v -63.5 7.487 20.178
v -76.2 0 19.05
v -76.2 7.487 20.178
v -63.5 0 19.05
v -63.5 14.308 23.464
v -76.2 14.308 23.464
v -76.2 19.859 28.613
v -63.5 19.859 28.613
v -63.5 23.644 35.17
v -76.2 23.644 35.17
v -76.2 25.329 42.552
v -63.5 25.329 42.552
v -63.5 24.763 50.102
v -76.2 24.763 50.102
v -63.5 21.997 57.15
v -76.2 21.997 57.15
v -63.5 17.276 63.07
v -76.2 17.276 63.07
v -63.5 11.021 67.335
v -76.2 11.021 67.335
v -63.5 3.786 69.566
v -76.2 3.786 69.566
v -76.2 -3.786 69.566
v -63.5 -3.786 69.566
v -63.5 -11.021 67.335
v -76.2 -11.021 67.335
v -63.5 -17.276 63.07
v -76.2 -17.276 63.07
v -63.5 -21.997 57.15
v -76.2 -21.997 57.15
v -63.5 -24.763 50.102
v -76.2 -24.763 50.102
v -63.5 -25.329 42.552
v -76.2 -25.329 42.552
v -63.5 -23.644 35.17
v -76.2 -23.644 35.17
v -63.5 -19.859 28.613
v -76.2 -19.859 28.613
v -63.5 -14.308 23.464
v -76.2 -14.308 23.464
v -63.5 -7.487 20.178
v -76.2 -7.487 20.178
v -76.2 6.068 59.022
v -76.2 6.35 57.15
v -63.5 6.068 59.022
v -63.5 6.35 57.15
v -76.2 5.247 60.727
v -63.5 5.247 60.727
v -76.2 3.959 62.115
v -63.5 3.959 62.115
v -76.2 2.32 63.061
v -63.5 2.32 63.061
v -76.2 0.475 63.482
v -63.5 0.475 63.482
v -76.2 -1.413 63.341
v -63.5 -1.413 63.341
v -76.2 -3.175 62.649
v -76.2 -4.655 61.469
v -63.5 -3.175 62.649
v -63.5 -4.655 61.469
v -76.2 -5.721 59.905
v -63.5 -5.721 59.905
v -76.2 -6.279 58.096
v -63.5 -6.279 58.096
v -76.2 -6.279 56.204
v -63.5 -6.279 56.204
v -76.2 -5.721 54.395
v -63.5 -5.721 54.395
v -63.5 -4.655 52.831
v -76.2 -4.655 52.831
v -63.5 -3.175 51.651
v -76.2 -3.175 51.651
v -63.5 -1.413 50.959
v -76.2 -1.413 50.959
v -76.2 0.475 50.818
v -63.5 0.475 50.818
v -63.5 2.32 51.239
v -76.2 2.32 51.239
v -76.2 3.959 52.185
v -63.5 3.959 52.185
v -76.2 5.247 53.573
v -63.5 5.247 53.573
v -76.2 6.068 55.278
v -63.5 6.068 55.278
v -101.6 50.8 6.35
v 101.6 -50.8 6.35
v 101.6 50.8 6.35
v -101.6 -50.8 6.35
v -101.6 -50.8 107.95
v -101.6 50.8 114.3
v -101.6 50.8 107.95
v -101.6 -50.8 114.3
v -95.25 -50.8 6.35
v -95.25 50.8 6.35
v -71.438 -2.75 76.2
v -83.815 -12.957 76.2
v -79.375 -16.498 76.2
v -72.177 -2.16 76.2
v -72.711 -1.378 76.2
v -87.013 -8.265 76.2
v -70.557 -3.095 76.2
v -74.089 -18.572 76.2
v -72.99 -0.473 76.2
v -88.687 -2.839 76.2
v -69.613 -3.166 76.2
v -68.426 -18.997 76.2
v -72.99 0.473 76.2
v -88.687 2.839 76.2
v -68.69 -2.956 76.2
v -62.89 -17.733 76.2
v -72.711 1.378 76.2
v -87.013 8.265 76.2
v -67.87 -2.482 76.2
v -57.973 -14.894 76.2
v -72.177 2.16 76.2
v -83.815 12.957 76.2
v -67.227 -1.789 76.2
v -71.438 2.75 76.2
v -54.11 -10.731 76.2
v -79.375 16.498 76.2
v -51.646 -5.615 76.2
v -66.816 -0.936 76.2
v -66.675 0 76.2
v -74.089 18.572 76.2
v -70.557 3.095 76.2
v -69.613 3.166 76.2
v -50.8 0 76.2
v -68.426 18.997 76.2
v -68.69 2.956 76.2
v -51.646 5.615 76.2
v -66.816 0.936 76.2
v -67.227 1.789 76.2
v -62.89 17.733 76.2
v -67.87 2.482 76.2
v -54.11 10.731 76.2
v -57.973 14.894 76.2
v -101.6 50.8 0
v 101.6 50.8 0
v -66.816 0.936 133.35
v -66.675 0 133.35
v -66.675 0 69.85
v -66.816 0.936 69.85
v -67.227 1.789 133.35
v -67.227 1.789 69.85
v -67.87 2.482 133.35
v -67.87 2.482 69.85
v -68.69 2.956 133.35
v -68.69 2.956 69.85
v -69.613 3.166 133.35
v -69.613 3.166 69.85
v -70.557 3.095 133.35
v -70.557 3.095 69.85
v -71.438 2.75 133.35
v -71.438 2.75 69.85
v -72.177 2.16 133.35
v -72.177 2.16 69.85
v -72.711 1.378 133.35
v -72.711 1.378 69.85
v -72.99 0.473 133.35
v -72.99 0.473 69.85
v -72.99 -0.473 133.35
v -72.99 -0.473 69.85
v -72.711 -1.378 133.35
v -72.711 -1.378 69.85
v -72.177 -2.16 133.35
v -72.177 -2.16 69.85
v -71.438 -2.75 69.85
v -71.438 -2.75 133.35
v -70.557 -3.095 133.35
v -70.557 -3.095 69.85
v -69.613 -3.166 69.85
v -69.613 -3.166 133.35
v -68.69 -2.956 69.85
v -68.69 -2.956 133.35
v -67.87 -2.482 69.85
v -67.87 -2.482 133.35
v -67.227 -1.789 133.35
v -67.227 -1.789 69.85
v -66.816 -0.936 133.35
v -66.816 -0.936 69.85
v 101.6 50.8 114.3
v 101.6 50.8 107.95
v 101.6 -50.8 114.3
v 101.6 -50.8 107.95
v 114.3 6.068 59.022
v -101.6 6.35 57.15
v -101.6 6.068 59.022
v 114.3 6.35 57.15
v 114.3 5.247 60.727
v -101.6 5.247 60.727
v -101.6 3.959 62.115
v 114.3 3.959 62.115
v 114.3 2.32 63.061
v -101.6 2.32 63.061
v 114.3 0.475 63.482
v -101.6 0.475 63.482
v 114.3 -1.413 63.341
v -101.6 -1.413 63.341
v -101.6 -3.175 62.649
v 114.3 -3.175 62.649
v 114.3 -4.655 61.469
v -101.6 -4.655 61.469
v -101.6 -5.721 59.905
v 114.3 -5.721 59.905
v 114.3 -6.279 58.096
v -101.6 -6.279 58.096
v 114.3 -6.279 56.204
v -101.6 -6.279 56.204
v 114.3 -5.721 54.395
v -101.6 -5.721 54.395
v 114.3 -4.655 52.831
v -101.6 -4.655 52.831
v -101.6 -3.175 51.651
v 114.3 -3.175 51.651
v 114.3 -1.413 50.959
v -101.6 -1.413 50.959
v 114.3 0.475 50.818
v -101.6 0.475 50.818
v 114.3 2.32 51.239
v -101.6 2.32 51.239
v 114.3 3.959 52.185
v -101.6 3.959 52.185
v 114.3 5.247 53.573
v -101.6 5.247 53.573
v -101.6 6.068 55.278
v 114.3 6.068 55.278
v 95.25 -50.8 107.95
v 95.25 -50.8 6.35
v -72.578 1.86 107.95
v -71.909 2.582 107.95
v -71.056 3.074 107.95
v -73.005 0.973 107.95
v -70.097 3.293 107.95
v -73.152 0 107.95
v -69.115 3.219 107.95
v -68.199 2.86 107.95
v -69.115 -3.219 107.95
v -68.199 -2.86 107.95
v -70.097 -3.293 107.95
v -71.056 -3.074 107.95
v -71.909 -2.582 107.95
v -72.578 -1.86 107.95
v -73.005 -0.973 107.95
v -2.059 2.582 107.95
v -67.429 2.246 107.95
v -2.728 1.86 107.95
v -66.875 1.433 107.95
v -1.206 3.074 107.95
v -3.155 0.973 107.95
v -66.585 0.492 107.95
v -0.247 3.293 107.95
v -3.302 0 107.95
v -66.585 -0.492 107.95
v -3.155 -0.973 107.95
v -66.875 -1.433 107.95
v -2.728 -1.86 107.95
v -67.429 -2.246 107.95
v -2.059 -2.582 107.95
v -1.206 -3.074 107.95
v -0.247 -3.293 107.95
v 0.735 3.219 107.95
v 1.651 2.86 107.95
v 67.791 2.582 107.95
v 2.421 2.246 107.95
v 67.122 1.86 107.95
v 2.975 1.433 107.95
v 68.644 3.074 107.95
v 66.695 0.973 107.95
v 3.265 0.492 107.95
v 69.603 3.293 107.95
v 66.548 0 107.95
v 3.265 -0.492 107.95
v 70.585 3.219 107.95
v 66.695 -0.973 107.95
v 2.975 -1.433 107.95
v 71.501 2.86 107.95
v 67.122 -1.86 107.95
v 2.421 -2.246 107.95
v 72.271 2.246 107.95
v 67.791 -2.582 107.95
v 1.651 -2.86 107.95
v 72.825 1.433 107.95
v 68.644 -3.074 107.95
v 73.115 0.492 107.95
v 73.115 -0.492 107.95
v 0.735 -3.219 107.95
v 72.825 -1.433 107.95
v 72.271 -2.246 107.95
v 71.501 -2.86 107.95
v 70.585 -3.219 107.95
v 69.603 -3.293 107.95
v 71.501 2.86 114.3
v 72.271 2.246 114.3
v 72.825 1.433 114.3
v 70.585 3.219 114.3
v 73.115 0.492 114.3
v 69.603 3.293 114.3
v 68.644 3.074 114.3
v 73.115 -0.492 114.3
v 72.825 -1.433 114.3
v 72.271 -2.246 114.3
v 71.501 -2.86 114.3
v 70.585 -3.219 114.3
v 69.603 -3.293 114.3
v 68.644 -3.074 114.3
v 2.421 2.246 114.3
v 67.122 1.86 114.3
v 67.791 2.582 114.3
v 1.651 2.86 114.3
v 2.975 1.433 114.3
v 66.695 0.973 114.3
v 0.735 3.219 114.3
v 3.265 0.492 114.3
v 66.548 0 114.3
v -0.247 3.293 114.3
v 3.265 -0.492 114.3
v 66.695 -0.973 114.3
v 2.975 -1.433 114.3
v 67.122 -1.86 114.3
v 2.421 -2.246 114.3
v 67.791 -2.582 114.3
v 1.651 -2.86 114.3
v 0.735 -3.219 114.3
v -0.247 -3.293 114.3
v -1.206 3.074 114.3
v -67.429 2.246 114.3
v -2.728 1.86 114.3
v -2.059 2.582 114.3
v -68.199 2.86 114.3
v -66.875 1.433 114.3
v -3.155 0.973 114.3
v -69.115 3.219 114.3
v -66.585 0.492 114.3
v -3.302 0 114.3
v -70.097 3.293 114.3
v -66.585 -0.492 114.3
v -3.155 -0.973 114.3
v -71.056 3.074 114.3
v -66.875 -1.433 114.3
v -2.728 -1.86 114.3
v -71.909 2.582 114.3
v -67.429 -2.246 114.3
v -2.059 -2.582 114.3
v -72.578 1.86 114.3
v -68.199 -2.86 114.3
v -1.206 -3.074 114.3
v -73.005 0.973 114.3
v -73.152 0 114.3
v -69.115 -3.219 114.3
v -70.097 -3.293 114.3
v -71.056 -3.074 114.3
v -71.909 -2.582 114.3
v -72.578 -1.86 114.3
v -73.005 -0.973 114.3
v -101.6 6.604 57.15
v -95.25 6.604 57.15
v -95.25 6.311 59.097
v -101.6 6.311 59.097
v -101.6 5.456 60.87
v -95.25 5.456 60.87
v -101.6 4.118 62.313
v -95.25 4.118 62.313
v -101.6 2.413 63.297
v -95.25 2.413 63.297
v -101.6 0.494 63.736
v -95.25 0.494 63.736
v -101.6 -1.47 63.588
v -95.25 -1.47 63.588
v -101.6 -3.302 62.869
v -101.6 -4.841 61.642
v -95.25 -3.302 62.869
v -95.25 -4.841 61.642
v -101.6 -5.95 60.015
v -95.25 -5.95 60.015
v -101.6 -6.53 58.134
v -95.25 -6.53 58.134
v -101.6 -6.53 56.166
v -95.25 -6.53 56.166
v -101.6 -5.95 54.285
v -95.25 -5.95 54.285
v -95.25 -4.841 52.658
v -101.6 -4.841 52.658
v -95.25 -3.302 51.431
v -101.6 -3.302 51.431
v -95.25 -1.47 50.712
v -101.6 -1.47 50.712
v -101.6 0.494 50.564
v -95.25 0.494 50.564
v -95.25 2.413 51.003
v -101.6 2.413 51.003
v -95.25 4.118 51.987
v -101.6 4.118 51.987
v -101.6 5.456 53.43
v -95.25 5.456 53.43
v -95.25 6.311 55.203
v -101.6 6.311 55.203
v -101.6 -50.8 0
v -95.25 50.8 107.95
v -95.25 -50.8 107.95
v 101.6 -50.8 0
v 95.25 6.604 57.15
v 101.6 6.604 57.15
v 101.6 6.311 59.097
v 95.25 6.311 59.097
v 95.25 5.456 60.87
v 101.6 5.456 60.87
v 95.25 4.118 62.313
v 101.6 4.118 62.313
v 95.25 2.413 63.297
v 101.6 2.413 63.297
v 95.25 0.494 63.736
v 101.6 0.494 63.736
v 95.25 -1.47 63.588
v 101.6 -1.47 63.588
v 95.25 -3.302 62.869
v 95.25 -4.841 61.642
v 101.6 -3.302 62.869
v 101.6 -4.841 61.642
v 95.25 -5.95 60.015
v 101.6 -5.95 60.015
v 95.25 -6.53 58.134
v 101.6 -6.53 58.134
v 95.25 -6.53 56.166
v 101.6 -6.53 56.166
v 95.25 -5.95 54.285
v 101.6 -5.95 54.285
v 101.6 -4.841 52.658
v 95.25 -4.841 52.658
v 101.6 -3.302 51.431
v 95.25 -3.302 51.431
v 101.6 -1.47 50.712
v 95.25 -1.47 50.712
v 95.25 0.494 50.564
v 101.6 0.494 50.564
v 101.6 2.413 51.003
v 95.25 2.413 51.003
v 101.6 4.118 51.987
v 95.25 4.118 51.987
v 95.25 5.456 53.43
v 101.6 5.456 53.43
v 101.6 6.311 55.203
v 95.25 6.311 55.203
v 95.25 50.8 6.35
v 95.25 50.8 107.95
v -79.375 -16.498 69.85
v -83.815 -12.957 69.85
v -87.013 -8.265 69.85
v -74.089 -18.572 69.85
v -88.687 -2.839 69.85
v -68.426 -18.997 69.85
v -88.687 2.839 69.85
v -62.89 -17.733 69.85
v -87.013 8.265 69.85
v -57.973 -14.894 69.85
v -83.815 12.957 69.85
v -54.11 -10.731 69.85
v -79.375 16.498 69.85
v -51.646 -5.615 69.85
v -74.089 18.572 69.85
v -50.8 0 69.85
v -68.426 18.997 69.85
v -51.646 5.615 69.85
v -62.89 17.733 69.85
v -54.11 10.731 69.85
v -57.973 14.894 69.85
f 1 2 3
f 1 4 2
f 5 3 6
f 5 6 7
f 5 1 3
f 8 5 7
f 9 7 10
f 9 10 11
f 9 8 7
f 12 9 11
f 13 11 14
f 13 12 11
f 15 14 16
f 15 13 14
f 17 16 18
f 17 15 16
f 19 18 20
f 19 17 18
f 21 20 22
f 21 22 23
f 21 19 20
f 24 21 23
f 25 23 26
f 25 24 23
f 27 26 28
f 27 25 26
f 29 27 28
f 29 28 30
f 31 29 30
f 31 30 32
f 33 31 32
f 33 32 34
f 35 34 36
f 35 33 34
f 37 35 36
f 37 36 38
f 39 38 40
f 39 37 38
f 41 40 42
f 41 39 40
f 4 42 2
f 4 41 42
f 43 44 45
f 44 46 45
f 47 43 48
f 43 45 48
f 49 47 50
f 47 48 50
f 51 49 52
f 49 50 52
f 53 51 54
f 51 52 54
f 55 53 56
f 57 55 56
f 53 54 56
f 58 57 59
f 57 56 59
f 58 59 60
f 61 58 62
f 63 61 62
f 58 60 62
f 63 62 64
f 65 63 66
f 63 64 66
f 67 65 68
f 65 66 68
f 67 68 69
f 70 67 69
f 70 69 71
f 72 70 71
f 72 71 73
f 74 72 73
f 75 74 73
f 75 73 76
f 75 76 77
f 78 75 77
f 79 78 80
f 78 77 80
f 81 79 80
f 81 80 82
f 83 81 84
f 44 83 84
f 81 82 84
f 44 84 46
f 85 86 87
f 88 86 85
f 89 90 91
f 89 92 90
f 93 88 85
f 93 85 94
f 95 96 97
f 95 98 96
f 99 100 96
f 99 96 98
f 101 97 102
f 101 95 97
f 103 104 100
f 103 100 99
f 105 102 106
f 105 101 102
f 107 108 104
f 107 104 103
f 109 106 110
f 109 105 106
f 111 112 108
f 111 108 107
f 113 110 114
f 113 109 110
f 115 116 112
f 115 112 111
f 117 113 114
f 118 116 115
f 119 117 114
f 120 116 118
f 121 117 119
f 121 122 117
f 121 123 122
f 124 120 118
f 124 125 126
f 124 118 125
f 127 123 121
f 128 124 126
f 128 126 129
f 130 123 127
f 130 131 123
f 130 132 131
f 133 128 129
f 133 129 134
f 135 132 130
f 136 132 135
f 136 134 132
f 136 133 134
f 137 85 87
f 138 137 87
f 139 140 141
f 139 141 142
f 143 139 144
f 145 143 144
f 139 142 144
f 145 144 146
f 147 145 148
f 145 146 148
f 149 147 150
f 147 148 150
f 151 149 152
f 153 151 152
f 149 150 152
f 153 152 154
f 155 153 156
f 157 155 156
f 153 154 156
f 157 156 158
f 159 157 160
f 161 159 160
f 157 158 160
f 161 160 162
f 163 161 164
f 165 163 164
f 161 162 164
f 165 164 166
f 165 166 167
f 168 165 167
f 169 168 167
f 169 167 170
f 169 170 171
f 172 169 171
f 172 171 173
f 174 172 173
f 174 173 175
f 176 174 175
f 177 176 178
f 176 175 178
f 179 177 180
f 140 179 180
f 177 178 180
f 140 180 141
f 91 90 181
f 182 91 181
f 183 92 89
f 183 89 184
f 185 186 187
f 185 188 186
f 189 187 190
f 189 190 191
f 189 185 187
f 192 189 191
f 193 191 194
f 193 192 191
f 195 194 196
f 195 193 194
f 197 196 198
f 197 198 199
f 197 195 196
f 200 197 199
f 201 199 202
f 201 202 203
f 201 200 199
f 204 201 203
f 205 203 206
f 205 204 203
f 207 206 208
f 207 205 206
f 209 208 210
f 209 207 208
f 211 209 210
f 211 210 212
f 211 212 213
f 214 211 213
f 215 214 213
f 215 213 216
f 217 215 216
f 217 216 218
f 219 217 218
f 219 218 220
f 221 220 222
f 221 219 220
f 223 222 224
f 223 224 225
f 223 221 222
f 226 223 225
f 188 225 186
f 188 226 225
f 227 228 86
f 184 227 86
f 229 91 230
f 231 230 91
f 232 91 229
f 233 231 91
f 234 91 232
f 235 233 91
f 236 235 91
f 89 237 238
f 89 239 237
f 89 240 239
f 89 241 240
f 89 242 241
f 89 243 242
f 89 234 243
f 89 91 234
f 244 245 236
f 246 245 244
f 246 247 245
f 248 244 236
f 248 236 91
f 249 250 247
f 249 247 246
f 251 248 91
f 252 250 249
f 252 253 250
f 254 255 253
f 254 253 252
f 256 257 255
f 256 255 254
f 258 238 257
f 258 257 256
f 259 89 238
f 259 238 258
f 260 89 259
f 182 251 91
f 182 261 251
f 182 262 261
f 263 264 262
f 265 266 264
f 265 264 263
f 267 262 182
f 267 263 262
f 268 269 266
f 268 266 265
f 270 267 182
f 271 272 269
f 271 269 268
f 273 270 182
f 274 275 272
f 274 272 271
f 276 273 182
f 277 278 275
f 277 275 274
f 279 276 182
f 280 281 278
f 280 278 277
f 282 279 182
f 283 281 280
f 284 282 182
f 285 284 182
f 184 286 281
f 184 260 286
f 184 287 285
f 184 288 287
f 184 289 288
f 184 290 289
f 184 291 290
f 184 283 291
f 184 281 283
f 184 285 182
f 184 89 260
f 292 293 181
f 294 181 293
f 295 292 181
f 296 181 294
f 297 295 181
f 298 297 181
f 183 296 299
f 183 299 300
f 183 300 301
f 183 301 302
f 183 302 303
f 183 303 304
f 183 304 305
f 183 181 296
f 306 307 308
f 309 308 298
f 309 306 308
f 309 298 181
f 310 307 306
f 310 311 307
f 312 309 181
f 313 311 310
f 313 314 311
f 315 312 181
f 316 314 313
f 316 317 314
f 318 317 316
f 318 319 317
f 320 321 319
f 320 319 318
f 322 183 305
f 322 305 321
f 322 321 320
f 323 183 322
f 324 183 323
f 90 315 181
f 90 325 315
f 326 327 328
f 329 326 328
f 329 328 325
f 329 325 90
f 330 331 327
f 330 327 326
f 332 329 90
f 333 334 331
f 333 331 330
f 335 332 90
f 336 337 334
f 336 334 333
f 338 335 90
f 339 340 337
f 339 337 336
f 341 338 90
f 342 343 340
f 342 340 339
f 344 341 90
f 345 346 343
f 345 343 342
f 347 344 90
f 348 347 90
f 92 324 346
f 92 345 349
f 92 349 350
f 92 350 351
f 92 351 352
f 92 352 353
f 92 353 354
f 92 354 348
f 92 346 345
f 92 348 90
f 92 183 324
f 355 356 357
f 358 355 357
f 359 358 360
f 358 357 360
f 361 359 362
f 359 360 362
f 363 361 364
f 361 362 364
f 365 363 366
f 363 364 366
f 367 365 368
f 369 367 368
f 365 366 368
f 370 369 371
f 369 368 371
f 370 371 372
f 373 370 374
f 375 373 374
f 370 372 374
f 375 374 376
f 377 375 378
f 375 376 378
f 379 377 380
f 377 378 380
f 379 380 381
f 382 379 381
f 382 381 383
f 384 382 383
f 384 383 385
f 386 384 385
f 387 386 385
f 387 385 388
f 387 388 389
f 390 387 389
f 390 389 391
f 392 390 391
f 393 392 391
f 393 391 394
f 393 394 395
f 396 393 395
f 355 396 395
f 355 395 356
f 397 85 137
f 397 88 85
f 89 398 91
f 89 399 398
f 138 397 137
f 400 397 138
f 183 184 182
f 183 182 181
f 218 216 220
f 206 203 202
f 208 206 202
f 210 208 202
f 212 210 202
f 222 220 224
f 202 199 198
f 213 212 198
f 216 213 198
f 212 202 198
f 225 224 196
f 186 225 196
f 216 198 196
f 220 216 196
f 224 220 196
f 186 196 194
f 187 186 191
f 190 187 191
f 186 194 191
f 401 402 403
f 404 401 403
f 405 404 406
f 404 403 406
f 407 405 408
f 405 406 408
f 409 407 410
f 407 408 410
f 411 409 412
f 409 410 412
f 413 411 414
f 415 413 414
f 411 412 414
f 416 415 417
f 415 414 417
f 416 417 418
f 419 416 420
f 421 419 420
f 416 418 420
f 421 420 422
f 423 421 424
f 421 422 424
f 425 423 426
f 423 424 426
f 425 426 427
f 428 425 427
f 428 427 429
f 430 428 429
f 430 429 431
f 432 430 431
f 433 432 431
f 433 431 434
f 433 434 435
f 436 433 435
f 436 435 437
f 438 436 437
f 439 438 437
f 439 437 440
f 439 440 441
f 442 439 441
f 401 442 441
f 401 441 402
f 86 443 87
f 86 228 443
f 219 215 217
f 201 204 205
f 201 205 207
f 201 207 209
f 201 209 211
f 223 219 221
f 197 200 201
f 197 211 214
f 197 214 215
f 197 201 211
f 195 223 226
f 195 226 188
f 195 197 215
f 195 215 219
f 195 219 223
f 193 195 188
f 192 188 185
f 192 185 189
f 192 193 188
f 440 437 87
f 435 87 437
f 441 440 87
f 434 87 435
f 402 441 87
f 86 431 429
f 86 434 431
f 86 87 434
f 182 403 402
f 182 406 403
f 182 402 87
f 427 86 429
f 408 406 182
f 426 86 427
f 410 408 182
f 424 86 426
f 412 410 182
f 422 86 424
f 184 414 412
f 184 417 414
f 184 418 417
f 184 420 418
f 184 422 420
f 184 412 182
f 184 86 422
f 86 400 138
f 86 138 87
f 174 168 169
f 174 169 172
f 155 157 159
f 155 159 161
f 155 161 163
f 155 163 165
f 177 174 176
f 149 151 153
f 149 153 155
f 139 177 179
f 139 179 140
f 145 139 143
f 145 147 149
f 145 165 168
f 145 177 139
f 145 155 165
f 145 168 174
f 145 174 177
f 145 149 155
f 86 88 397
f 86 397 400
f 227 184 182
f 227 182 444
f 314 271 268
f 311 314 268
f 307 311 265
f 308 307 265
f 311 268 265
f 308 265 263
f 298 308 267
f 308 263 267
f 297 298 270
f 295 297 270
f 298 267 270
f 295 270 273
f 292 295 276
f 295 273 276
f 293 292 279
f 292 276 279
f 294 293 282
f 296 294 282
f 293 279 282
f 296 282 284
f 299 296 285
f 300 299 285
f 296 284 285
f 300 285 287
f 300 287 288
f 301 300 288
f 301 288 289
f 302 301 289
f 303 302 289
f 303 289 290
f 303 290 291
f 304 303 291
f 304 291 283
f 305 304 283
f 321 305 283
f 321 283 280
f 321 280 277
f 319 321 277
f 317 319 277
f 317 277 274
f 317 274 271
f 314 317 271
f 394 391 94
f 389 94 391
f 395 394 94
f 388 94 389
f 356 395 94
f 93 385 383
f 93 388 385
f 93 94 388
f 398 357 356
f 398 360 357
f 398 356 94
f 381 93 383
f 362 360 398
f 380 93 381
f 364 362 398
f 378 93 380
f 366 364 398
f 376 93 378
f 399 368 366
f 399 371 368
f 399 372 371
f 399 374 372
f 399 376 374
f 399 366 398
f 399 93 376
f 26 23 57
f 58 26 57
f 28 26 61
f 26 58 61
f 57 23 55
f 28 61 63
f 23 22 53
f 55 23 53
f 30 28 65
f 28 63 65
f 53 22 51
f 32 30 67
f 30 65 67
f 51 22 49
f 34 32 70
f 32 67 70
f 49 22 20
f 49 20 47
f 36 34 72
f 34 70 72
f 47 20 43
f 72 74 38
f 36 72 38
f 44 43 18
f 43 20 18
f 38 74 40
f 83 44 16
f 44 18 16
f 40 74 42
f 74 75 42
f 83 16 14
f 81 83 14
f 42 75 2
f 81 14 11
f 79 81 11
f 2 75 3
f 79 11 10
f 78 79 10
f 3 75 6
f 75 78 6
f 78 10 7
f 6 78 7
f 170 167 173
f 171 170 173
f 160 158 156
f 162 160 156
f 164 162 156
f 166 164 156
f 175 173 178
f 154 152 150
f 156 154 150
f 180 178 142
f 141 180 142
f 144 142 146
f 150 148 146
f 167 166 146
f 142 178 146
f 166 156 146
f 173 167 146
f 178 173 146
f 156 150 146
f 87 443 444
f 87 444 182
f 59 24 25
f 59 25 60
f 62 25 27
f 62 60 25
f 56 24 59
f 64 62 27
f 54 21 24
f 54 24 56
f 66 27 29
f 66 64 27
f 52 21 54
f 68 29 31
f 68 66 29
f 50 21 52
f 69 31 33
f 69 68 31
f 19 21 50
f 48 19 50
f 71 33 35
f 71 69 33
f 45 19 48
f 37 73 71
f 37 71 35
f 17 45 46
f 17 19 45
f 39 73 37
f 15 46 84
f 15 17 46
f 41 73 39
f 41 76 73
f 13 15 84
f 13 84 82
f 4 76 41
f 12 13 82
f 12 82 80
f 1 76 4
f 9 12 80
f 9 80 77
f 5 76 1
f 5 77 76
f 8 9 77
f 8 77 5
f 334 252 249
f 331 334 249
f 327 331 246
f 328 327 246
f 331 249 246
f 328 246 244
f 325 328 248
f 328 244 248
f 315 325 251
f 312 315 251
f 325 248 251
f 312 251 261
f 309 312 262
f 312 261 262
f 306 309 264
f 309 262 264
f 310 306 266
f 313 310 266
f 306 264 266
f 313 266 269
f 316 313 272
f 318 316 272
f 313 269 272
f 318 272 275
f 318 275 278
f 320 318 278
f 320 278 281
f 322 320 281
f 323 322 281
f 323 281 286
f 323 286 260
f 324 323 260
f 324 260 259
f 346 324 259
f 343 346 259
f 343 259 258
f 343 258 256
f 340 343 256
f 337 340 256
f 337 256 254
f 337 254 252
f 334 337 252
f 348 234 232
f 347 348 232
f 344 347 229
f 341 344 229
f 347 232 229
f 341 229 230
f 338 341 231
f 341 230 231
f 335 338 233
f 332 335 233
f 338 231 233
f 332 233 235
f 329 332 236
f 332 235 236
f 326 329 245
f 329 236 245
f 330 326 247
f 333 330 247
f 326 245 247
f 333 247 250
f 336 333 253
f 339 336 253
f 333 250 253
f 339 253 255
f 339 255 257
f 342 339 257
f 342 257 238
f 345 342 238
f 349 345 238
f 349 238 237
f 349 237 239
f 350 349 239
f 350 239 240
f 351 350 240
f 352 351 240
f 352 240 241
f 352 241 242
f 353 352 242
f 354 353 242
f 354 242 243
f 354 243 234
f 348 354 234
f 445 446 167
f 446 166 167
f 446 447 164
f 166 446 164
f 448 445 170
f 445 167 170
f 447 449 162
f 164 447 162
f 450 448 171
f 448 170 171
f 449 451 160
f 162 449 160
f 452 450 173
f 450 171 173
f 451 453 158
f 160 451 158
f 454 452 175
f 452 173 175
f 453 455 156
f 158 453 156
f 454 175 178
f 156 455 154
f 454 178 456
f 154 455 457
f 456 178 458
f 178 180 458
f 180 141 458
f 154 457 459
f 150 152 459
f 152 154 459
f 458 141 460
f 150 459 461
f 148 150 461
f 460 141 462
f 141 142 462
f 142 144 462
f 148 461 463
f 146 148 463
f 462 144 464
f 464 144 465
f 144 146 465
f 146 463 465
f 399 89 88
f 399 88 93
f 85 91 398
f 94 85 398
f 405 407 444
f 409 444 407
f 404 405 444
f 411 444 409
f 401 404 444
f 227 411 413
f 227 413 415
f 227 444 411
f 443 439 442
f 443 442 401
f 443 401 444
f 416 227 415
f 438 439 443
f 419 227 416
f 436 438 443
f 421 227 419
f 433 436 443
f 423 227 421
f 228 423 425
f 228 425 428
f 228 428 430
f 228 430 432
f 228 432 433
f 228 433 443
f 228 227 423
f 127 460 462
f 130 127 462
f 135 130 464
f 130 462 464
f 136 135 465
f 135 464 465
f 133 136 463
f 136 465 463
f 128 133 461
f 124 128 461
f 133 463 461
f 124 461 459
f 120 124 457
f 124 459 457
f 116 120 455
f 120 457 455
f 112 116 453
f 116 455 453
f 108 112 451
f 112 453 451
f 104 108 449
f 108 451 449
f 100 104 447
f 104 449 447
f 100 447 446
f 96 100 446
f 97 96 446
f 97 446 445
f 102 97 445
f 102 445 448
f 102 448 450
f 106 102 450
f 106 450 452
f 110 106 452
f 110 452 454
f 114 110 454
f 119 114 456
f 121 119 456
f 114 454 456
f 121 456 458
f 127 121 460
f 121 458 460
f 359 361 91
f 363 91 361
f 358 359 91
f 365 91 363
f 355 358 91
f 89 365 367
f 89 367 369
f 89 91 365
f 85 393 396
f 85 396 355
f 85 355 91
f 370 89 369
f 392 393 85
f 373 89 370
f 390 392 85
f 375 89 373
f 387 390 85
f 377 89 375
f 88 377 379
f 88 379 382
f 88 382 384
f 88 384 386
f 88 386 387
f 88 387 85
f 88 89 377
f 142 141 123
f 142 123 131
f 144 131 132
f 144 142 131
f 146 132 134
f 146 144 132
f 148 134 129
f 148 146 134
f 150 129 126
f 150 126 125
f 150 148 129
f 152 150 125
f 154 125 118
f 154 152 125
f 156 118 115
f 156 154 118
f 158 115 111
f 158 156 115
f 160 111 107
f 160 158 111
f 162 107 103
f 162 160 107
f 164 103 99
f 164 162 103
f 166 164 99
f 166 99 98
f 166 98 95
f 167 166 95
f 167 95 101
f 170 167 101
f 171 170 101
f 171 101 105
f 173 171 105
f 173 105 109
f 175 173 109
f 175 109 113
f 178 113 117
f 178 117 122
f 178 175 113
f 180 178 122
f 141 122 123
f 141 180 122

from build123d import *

# Parameters (mm, degrees)
F2_DEPTH      = 50.8
F3_DEPTH      = 50.8
F3_DEPTH_BACK = 50.8
F4_R          = 6.604
F4_R_2        = 6.35
F5_DEPTH      = 203.201
F6_DEPTH      = 12.7
F6_DEPTH_BACK = 203.2
F0_W          = 12.7
F0_H          = 25.4
F10_D         = 6.604
F12_R         = 3.175
F13_DEPTH     = 63.5
F12_R_2       = 19.05
F14_DEPTH     = 6.35


with BuildPart() as f2:
    # F0 (on Front) → F2 (new body, symmetric)
    with BuildSketch(Plane.XZ):
        Polygon((-95.25, 6.35), (-101.6, 6.35), (-101.6, 0), (101.6, 0), (101.6, 6.35), (95.25, 6.35), align=None)
    extrude(amount=F2_DEPTH, both=True)


with BuildPart() as f2b:
    # F0 (on Front) → F2, piece 2 (new body, symmetric)
    with BuildSketch(Plane.XZ):
        Polygon((-101.6, 114.3), (-101.6, 107.95), (-95.25, 107.95), (95.25, 107.95), (101.6, 107.95), (101.6, 114.3), align=None)
    extrude(amount=F2_DEPTH, both=True)

    # F10 (through all)
    with Locations(Plane.XY.offset(114.3)):
        with Locations((-69.85, 0), (0, 0), (69.85, 0)):
            Hole(F10_D / 2)


with BuildPart() as f3:
    # F0 (on Front) → F3 (new body, two sides)
    with BuildSketch(Plane.XZ) as f3_sk:
        Polygon((-101.6, 107.95), (-101.6, 6.35), (-95.25, 6.35), (-95.25, 57.15), (-95.25, 107.95), align=None)
    extrude(amount=F3_DEPTH)
    extrude(f3_sk.sketch, amount=-F3_DEPTH_BACK)


with BuildPart() as f3b:
    # F0 (on Front) → F3, piece 2 (new body, two sides)
    with BuildSketch(Plane.XZ) as f3_2_sk:
        Polygon((95.25, 57.15), (95.25, 6.35), (101.6, 6.35), (101.6, 107.95), (95.25, 107.95), align=None)
    extrude(amount=F3_DEPTH)
    extrude(f3_2_sk.sketch, amount=-F3_DEPTH_BACK)


with BuildPart() as f5_tool:
    # F4 (on face) → F5 (new body, through all)
    with BuildSketch(Plane.YZ.offset(101.6)):
        with Locations((0, 57.15)):
            Circle(F4_R)
        with Locations((0, 57.15)):
            Circle(F4_R_2, mode=Mode.SUBTRACT)
        with Locations((0, 57.15)):
            Circle(F4_R_2)
    extrude(amount=-F5_DEPTH)


with BuildPart() as f3_1:
    add(f3.part)

    # F5: cut by f5_tool
    add(f5_tool.part, mode=Mode.SUBTRACT)


with BuildPart() as f3b_1:
    add(f3b.part)

    # F5: cut by f5_tool
    add(f5_tool.part, mode=Mode.SUBTRACT)


with BuildPart() as f6:
    # F4 (on face) → F6 (new body, two sides)
    with BuildSketch(Plane.YZ.offset(101.6)) as f6_sk:
        with Locations((0, 57.15)):
            Circle(F4_R_2)
    extrude(amount=F6_DEPTH)
    extrude(f6_sk.sketch, amount=-F6_DEPTH_BACK)


with BuildPart() as f7:
    # F0 (on Front) → F7 (revolve)
    with BuildSketch(Plane.XZ):
        with Locations((-69.85, 31.75)):
            Rectangle(F0_W, F0_H)
    revolve(axis=Axis((-69.85, 0, 44.45), (1, 0, 0)))

    # F8: cut F6
    add(f6.part, mode=Mode.SUBTRACT)


with BuildPart() as f13:
    # F12 (on plane+point) → F13 (new body, through all)
    with BuildSketch(Plane.XY.offset(69.85)):
        with Locations((-69.85, 0)):
            Circle(F12_R)
    extrude(amount=F13_DEPTH)


with BuildPart() as f14:
    # F12 (on plane+point) → F14 (new body)
    with BuildSketch(Plane.XY.offset(69.85)):
        with Locations((-69.85, 0)):
            Circle(F12_R_2)
        with Locations((-69.85, 0)):
            Circle(F12_R, mode=Mode.SUBTRACT)
    extrude(amount=F14_DEPTH)


solid = Compound([f2.part, f2b.part, f3_1.part, f3b_1.part, f6.part, f7.part, f13.part, f14.part])
